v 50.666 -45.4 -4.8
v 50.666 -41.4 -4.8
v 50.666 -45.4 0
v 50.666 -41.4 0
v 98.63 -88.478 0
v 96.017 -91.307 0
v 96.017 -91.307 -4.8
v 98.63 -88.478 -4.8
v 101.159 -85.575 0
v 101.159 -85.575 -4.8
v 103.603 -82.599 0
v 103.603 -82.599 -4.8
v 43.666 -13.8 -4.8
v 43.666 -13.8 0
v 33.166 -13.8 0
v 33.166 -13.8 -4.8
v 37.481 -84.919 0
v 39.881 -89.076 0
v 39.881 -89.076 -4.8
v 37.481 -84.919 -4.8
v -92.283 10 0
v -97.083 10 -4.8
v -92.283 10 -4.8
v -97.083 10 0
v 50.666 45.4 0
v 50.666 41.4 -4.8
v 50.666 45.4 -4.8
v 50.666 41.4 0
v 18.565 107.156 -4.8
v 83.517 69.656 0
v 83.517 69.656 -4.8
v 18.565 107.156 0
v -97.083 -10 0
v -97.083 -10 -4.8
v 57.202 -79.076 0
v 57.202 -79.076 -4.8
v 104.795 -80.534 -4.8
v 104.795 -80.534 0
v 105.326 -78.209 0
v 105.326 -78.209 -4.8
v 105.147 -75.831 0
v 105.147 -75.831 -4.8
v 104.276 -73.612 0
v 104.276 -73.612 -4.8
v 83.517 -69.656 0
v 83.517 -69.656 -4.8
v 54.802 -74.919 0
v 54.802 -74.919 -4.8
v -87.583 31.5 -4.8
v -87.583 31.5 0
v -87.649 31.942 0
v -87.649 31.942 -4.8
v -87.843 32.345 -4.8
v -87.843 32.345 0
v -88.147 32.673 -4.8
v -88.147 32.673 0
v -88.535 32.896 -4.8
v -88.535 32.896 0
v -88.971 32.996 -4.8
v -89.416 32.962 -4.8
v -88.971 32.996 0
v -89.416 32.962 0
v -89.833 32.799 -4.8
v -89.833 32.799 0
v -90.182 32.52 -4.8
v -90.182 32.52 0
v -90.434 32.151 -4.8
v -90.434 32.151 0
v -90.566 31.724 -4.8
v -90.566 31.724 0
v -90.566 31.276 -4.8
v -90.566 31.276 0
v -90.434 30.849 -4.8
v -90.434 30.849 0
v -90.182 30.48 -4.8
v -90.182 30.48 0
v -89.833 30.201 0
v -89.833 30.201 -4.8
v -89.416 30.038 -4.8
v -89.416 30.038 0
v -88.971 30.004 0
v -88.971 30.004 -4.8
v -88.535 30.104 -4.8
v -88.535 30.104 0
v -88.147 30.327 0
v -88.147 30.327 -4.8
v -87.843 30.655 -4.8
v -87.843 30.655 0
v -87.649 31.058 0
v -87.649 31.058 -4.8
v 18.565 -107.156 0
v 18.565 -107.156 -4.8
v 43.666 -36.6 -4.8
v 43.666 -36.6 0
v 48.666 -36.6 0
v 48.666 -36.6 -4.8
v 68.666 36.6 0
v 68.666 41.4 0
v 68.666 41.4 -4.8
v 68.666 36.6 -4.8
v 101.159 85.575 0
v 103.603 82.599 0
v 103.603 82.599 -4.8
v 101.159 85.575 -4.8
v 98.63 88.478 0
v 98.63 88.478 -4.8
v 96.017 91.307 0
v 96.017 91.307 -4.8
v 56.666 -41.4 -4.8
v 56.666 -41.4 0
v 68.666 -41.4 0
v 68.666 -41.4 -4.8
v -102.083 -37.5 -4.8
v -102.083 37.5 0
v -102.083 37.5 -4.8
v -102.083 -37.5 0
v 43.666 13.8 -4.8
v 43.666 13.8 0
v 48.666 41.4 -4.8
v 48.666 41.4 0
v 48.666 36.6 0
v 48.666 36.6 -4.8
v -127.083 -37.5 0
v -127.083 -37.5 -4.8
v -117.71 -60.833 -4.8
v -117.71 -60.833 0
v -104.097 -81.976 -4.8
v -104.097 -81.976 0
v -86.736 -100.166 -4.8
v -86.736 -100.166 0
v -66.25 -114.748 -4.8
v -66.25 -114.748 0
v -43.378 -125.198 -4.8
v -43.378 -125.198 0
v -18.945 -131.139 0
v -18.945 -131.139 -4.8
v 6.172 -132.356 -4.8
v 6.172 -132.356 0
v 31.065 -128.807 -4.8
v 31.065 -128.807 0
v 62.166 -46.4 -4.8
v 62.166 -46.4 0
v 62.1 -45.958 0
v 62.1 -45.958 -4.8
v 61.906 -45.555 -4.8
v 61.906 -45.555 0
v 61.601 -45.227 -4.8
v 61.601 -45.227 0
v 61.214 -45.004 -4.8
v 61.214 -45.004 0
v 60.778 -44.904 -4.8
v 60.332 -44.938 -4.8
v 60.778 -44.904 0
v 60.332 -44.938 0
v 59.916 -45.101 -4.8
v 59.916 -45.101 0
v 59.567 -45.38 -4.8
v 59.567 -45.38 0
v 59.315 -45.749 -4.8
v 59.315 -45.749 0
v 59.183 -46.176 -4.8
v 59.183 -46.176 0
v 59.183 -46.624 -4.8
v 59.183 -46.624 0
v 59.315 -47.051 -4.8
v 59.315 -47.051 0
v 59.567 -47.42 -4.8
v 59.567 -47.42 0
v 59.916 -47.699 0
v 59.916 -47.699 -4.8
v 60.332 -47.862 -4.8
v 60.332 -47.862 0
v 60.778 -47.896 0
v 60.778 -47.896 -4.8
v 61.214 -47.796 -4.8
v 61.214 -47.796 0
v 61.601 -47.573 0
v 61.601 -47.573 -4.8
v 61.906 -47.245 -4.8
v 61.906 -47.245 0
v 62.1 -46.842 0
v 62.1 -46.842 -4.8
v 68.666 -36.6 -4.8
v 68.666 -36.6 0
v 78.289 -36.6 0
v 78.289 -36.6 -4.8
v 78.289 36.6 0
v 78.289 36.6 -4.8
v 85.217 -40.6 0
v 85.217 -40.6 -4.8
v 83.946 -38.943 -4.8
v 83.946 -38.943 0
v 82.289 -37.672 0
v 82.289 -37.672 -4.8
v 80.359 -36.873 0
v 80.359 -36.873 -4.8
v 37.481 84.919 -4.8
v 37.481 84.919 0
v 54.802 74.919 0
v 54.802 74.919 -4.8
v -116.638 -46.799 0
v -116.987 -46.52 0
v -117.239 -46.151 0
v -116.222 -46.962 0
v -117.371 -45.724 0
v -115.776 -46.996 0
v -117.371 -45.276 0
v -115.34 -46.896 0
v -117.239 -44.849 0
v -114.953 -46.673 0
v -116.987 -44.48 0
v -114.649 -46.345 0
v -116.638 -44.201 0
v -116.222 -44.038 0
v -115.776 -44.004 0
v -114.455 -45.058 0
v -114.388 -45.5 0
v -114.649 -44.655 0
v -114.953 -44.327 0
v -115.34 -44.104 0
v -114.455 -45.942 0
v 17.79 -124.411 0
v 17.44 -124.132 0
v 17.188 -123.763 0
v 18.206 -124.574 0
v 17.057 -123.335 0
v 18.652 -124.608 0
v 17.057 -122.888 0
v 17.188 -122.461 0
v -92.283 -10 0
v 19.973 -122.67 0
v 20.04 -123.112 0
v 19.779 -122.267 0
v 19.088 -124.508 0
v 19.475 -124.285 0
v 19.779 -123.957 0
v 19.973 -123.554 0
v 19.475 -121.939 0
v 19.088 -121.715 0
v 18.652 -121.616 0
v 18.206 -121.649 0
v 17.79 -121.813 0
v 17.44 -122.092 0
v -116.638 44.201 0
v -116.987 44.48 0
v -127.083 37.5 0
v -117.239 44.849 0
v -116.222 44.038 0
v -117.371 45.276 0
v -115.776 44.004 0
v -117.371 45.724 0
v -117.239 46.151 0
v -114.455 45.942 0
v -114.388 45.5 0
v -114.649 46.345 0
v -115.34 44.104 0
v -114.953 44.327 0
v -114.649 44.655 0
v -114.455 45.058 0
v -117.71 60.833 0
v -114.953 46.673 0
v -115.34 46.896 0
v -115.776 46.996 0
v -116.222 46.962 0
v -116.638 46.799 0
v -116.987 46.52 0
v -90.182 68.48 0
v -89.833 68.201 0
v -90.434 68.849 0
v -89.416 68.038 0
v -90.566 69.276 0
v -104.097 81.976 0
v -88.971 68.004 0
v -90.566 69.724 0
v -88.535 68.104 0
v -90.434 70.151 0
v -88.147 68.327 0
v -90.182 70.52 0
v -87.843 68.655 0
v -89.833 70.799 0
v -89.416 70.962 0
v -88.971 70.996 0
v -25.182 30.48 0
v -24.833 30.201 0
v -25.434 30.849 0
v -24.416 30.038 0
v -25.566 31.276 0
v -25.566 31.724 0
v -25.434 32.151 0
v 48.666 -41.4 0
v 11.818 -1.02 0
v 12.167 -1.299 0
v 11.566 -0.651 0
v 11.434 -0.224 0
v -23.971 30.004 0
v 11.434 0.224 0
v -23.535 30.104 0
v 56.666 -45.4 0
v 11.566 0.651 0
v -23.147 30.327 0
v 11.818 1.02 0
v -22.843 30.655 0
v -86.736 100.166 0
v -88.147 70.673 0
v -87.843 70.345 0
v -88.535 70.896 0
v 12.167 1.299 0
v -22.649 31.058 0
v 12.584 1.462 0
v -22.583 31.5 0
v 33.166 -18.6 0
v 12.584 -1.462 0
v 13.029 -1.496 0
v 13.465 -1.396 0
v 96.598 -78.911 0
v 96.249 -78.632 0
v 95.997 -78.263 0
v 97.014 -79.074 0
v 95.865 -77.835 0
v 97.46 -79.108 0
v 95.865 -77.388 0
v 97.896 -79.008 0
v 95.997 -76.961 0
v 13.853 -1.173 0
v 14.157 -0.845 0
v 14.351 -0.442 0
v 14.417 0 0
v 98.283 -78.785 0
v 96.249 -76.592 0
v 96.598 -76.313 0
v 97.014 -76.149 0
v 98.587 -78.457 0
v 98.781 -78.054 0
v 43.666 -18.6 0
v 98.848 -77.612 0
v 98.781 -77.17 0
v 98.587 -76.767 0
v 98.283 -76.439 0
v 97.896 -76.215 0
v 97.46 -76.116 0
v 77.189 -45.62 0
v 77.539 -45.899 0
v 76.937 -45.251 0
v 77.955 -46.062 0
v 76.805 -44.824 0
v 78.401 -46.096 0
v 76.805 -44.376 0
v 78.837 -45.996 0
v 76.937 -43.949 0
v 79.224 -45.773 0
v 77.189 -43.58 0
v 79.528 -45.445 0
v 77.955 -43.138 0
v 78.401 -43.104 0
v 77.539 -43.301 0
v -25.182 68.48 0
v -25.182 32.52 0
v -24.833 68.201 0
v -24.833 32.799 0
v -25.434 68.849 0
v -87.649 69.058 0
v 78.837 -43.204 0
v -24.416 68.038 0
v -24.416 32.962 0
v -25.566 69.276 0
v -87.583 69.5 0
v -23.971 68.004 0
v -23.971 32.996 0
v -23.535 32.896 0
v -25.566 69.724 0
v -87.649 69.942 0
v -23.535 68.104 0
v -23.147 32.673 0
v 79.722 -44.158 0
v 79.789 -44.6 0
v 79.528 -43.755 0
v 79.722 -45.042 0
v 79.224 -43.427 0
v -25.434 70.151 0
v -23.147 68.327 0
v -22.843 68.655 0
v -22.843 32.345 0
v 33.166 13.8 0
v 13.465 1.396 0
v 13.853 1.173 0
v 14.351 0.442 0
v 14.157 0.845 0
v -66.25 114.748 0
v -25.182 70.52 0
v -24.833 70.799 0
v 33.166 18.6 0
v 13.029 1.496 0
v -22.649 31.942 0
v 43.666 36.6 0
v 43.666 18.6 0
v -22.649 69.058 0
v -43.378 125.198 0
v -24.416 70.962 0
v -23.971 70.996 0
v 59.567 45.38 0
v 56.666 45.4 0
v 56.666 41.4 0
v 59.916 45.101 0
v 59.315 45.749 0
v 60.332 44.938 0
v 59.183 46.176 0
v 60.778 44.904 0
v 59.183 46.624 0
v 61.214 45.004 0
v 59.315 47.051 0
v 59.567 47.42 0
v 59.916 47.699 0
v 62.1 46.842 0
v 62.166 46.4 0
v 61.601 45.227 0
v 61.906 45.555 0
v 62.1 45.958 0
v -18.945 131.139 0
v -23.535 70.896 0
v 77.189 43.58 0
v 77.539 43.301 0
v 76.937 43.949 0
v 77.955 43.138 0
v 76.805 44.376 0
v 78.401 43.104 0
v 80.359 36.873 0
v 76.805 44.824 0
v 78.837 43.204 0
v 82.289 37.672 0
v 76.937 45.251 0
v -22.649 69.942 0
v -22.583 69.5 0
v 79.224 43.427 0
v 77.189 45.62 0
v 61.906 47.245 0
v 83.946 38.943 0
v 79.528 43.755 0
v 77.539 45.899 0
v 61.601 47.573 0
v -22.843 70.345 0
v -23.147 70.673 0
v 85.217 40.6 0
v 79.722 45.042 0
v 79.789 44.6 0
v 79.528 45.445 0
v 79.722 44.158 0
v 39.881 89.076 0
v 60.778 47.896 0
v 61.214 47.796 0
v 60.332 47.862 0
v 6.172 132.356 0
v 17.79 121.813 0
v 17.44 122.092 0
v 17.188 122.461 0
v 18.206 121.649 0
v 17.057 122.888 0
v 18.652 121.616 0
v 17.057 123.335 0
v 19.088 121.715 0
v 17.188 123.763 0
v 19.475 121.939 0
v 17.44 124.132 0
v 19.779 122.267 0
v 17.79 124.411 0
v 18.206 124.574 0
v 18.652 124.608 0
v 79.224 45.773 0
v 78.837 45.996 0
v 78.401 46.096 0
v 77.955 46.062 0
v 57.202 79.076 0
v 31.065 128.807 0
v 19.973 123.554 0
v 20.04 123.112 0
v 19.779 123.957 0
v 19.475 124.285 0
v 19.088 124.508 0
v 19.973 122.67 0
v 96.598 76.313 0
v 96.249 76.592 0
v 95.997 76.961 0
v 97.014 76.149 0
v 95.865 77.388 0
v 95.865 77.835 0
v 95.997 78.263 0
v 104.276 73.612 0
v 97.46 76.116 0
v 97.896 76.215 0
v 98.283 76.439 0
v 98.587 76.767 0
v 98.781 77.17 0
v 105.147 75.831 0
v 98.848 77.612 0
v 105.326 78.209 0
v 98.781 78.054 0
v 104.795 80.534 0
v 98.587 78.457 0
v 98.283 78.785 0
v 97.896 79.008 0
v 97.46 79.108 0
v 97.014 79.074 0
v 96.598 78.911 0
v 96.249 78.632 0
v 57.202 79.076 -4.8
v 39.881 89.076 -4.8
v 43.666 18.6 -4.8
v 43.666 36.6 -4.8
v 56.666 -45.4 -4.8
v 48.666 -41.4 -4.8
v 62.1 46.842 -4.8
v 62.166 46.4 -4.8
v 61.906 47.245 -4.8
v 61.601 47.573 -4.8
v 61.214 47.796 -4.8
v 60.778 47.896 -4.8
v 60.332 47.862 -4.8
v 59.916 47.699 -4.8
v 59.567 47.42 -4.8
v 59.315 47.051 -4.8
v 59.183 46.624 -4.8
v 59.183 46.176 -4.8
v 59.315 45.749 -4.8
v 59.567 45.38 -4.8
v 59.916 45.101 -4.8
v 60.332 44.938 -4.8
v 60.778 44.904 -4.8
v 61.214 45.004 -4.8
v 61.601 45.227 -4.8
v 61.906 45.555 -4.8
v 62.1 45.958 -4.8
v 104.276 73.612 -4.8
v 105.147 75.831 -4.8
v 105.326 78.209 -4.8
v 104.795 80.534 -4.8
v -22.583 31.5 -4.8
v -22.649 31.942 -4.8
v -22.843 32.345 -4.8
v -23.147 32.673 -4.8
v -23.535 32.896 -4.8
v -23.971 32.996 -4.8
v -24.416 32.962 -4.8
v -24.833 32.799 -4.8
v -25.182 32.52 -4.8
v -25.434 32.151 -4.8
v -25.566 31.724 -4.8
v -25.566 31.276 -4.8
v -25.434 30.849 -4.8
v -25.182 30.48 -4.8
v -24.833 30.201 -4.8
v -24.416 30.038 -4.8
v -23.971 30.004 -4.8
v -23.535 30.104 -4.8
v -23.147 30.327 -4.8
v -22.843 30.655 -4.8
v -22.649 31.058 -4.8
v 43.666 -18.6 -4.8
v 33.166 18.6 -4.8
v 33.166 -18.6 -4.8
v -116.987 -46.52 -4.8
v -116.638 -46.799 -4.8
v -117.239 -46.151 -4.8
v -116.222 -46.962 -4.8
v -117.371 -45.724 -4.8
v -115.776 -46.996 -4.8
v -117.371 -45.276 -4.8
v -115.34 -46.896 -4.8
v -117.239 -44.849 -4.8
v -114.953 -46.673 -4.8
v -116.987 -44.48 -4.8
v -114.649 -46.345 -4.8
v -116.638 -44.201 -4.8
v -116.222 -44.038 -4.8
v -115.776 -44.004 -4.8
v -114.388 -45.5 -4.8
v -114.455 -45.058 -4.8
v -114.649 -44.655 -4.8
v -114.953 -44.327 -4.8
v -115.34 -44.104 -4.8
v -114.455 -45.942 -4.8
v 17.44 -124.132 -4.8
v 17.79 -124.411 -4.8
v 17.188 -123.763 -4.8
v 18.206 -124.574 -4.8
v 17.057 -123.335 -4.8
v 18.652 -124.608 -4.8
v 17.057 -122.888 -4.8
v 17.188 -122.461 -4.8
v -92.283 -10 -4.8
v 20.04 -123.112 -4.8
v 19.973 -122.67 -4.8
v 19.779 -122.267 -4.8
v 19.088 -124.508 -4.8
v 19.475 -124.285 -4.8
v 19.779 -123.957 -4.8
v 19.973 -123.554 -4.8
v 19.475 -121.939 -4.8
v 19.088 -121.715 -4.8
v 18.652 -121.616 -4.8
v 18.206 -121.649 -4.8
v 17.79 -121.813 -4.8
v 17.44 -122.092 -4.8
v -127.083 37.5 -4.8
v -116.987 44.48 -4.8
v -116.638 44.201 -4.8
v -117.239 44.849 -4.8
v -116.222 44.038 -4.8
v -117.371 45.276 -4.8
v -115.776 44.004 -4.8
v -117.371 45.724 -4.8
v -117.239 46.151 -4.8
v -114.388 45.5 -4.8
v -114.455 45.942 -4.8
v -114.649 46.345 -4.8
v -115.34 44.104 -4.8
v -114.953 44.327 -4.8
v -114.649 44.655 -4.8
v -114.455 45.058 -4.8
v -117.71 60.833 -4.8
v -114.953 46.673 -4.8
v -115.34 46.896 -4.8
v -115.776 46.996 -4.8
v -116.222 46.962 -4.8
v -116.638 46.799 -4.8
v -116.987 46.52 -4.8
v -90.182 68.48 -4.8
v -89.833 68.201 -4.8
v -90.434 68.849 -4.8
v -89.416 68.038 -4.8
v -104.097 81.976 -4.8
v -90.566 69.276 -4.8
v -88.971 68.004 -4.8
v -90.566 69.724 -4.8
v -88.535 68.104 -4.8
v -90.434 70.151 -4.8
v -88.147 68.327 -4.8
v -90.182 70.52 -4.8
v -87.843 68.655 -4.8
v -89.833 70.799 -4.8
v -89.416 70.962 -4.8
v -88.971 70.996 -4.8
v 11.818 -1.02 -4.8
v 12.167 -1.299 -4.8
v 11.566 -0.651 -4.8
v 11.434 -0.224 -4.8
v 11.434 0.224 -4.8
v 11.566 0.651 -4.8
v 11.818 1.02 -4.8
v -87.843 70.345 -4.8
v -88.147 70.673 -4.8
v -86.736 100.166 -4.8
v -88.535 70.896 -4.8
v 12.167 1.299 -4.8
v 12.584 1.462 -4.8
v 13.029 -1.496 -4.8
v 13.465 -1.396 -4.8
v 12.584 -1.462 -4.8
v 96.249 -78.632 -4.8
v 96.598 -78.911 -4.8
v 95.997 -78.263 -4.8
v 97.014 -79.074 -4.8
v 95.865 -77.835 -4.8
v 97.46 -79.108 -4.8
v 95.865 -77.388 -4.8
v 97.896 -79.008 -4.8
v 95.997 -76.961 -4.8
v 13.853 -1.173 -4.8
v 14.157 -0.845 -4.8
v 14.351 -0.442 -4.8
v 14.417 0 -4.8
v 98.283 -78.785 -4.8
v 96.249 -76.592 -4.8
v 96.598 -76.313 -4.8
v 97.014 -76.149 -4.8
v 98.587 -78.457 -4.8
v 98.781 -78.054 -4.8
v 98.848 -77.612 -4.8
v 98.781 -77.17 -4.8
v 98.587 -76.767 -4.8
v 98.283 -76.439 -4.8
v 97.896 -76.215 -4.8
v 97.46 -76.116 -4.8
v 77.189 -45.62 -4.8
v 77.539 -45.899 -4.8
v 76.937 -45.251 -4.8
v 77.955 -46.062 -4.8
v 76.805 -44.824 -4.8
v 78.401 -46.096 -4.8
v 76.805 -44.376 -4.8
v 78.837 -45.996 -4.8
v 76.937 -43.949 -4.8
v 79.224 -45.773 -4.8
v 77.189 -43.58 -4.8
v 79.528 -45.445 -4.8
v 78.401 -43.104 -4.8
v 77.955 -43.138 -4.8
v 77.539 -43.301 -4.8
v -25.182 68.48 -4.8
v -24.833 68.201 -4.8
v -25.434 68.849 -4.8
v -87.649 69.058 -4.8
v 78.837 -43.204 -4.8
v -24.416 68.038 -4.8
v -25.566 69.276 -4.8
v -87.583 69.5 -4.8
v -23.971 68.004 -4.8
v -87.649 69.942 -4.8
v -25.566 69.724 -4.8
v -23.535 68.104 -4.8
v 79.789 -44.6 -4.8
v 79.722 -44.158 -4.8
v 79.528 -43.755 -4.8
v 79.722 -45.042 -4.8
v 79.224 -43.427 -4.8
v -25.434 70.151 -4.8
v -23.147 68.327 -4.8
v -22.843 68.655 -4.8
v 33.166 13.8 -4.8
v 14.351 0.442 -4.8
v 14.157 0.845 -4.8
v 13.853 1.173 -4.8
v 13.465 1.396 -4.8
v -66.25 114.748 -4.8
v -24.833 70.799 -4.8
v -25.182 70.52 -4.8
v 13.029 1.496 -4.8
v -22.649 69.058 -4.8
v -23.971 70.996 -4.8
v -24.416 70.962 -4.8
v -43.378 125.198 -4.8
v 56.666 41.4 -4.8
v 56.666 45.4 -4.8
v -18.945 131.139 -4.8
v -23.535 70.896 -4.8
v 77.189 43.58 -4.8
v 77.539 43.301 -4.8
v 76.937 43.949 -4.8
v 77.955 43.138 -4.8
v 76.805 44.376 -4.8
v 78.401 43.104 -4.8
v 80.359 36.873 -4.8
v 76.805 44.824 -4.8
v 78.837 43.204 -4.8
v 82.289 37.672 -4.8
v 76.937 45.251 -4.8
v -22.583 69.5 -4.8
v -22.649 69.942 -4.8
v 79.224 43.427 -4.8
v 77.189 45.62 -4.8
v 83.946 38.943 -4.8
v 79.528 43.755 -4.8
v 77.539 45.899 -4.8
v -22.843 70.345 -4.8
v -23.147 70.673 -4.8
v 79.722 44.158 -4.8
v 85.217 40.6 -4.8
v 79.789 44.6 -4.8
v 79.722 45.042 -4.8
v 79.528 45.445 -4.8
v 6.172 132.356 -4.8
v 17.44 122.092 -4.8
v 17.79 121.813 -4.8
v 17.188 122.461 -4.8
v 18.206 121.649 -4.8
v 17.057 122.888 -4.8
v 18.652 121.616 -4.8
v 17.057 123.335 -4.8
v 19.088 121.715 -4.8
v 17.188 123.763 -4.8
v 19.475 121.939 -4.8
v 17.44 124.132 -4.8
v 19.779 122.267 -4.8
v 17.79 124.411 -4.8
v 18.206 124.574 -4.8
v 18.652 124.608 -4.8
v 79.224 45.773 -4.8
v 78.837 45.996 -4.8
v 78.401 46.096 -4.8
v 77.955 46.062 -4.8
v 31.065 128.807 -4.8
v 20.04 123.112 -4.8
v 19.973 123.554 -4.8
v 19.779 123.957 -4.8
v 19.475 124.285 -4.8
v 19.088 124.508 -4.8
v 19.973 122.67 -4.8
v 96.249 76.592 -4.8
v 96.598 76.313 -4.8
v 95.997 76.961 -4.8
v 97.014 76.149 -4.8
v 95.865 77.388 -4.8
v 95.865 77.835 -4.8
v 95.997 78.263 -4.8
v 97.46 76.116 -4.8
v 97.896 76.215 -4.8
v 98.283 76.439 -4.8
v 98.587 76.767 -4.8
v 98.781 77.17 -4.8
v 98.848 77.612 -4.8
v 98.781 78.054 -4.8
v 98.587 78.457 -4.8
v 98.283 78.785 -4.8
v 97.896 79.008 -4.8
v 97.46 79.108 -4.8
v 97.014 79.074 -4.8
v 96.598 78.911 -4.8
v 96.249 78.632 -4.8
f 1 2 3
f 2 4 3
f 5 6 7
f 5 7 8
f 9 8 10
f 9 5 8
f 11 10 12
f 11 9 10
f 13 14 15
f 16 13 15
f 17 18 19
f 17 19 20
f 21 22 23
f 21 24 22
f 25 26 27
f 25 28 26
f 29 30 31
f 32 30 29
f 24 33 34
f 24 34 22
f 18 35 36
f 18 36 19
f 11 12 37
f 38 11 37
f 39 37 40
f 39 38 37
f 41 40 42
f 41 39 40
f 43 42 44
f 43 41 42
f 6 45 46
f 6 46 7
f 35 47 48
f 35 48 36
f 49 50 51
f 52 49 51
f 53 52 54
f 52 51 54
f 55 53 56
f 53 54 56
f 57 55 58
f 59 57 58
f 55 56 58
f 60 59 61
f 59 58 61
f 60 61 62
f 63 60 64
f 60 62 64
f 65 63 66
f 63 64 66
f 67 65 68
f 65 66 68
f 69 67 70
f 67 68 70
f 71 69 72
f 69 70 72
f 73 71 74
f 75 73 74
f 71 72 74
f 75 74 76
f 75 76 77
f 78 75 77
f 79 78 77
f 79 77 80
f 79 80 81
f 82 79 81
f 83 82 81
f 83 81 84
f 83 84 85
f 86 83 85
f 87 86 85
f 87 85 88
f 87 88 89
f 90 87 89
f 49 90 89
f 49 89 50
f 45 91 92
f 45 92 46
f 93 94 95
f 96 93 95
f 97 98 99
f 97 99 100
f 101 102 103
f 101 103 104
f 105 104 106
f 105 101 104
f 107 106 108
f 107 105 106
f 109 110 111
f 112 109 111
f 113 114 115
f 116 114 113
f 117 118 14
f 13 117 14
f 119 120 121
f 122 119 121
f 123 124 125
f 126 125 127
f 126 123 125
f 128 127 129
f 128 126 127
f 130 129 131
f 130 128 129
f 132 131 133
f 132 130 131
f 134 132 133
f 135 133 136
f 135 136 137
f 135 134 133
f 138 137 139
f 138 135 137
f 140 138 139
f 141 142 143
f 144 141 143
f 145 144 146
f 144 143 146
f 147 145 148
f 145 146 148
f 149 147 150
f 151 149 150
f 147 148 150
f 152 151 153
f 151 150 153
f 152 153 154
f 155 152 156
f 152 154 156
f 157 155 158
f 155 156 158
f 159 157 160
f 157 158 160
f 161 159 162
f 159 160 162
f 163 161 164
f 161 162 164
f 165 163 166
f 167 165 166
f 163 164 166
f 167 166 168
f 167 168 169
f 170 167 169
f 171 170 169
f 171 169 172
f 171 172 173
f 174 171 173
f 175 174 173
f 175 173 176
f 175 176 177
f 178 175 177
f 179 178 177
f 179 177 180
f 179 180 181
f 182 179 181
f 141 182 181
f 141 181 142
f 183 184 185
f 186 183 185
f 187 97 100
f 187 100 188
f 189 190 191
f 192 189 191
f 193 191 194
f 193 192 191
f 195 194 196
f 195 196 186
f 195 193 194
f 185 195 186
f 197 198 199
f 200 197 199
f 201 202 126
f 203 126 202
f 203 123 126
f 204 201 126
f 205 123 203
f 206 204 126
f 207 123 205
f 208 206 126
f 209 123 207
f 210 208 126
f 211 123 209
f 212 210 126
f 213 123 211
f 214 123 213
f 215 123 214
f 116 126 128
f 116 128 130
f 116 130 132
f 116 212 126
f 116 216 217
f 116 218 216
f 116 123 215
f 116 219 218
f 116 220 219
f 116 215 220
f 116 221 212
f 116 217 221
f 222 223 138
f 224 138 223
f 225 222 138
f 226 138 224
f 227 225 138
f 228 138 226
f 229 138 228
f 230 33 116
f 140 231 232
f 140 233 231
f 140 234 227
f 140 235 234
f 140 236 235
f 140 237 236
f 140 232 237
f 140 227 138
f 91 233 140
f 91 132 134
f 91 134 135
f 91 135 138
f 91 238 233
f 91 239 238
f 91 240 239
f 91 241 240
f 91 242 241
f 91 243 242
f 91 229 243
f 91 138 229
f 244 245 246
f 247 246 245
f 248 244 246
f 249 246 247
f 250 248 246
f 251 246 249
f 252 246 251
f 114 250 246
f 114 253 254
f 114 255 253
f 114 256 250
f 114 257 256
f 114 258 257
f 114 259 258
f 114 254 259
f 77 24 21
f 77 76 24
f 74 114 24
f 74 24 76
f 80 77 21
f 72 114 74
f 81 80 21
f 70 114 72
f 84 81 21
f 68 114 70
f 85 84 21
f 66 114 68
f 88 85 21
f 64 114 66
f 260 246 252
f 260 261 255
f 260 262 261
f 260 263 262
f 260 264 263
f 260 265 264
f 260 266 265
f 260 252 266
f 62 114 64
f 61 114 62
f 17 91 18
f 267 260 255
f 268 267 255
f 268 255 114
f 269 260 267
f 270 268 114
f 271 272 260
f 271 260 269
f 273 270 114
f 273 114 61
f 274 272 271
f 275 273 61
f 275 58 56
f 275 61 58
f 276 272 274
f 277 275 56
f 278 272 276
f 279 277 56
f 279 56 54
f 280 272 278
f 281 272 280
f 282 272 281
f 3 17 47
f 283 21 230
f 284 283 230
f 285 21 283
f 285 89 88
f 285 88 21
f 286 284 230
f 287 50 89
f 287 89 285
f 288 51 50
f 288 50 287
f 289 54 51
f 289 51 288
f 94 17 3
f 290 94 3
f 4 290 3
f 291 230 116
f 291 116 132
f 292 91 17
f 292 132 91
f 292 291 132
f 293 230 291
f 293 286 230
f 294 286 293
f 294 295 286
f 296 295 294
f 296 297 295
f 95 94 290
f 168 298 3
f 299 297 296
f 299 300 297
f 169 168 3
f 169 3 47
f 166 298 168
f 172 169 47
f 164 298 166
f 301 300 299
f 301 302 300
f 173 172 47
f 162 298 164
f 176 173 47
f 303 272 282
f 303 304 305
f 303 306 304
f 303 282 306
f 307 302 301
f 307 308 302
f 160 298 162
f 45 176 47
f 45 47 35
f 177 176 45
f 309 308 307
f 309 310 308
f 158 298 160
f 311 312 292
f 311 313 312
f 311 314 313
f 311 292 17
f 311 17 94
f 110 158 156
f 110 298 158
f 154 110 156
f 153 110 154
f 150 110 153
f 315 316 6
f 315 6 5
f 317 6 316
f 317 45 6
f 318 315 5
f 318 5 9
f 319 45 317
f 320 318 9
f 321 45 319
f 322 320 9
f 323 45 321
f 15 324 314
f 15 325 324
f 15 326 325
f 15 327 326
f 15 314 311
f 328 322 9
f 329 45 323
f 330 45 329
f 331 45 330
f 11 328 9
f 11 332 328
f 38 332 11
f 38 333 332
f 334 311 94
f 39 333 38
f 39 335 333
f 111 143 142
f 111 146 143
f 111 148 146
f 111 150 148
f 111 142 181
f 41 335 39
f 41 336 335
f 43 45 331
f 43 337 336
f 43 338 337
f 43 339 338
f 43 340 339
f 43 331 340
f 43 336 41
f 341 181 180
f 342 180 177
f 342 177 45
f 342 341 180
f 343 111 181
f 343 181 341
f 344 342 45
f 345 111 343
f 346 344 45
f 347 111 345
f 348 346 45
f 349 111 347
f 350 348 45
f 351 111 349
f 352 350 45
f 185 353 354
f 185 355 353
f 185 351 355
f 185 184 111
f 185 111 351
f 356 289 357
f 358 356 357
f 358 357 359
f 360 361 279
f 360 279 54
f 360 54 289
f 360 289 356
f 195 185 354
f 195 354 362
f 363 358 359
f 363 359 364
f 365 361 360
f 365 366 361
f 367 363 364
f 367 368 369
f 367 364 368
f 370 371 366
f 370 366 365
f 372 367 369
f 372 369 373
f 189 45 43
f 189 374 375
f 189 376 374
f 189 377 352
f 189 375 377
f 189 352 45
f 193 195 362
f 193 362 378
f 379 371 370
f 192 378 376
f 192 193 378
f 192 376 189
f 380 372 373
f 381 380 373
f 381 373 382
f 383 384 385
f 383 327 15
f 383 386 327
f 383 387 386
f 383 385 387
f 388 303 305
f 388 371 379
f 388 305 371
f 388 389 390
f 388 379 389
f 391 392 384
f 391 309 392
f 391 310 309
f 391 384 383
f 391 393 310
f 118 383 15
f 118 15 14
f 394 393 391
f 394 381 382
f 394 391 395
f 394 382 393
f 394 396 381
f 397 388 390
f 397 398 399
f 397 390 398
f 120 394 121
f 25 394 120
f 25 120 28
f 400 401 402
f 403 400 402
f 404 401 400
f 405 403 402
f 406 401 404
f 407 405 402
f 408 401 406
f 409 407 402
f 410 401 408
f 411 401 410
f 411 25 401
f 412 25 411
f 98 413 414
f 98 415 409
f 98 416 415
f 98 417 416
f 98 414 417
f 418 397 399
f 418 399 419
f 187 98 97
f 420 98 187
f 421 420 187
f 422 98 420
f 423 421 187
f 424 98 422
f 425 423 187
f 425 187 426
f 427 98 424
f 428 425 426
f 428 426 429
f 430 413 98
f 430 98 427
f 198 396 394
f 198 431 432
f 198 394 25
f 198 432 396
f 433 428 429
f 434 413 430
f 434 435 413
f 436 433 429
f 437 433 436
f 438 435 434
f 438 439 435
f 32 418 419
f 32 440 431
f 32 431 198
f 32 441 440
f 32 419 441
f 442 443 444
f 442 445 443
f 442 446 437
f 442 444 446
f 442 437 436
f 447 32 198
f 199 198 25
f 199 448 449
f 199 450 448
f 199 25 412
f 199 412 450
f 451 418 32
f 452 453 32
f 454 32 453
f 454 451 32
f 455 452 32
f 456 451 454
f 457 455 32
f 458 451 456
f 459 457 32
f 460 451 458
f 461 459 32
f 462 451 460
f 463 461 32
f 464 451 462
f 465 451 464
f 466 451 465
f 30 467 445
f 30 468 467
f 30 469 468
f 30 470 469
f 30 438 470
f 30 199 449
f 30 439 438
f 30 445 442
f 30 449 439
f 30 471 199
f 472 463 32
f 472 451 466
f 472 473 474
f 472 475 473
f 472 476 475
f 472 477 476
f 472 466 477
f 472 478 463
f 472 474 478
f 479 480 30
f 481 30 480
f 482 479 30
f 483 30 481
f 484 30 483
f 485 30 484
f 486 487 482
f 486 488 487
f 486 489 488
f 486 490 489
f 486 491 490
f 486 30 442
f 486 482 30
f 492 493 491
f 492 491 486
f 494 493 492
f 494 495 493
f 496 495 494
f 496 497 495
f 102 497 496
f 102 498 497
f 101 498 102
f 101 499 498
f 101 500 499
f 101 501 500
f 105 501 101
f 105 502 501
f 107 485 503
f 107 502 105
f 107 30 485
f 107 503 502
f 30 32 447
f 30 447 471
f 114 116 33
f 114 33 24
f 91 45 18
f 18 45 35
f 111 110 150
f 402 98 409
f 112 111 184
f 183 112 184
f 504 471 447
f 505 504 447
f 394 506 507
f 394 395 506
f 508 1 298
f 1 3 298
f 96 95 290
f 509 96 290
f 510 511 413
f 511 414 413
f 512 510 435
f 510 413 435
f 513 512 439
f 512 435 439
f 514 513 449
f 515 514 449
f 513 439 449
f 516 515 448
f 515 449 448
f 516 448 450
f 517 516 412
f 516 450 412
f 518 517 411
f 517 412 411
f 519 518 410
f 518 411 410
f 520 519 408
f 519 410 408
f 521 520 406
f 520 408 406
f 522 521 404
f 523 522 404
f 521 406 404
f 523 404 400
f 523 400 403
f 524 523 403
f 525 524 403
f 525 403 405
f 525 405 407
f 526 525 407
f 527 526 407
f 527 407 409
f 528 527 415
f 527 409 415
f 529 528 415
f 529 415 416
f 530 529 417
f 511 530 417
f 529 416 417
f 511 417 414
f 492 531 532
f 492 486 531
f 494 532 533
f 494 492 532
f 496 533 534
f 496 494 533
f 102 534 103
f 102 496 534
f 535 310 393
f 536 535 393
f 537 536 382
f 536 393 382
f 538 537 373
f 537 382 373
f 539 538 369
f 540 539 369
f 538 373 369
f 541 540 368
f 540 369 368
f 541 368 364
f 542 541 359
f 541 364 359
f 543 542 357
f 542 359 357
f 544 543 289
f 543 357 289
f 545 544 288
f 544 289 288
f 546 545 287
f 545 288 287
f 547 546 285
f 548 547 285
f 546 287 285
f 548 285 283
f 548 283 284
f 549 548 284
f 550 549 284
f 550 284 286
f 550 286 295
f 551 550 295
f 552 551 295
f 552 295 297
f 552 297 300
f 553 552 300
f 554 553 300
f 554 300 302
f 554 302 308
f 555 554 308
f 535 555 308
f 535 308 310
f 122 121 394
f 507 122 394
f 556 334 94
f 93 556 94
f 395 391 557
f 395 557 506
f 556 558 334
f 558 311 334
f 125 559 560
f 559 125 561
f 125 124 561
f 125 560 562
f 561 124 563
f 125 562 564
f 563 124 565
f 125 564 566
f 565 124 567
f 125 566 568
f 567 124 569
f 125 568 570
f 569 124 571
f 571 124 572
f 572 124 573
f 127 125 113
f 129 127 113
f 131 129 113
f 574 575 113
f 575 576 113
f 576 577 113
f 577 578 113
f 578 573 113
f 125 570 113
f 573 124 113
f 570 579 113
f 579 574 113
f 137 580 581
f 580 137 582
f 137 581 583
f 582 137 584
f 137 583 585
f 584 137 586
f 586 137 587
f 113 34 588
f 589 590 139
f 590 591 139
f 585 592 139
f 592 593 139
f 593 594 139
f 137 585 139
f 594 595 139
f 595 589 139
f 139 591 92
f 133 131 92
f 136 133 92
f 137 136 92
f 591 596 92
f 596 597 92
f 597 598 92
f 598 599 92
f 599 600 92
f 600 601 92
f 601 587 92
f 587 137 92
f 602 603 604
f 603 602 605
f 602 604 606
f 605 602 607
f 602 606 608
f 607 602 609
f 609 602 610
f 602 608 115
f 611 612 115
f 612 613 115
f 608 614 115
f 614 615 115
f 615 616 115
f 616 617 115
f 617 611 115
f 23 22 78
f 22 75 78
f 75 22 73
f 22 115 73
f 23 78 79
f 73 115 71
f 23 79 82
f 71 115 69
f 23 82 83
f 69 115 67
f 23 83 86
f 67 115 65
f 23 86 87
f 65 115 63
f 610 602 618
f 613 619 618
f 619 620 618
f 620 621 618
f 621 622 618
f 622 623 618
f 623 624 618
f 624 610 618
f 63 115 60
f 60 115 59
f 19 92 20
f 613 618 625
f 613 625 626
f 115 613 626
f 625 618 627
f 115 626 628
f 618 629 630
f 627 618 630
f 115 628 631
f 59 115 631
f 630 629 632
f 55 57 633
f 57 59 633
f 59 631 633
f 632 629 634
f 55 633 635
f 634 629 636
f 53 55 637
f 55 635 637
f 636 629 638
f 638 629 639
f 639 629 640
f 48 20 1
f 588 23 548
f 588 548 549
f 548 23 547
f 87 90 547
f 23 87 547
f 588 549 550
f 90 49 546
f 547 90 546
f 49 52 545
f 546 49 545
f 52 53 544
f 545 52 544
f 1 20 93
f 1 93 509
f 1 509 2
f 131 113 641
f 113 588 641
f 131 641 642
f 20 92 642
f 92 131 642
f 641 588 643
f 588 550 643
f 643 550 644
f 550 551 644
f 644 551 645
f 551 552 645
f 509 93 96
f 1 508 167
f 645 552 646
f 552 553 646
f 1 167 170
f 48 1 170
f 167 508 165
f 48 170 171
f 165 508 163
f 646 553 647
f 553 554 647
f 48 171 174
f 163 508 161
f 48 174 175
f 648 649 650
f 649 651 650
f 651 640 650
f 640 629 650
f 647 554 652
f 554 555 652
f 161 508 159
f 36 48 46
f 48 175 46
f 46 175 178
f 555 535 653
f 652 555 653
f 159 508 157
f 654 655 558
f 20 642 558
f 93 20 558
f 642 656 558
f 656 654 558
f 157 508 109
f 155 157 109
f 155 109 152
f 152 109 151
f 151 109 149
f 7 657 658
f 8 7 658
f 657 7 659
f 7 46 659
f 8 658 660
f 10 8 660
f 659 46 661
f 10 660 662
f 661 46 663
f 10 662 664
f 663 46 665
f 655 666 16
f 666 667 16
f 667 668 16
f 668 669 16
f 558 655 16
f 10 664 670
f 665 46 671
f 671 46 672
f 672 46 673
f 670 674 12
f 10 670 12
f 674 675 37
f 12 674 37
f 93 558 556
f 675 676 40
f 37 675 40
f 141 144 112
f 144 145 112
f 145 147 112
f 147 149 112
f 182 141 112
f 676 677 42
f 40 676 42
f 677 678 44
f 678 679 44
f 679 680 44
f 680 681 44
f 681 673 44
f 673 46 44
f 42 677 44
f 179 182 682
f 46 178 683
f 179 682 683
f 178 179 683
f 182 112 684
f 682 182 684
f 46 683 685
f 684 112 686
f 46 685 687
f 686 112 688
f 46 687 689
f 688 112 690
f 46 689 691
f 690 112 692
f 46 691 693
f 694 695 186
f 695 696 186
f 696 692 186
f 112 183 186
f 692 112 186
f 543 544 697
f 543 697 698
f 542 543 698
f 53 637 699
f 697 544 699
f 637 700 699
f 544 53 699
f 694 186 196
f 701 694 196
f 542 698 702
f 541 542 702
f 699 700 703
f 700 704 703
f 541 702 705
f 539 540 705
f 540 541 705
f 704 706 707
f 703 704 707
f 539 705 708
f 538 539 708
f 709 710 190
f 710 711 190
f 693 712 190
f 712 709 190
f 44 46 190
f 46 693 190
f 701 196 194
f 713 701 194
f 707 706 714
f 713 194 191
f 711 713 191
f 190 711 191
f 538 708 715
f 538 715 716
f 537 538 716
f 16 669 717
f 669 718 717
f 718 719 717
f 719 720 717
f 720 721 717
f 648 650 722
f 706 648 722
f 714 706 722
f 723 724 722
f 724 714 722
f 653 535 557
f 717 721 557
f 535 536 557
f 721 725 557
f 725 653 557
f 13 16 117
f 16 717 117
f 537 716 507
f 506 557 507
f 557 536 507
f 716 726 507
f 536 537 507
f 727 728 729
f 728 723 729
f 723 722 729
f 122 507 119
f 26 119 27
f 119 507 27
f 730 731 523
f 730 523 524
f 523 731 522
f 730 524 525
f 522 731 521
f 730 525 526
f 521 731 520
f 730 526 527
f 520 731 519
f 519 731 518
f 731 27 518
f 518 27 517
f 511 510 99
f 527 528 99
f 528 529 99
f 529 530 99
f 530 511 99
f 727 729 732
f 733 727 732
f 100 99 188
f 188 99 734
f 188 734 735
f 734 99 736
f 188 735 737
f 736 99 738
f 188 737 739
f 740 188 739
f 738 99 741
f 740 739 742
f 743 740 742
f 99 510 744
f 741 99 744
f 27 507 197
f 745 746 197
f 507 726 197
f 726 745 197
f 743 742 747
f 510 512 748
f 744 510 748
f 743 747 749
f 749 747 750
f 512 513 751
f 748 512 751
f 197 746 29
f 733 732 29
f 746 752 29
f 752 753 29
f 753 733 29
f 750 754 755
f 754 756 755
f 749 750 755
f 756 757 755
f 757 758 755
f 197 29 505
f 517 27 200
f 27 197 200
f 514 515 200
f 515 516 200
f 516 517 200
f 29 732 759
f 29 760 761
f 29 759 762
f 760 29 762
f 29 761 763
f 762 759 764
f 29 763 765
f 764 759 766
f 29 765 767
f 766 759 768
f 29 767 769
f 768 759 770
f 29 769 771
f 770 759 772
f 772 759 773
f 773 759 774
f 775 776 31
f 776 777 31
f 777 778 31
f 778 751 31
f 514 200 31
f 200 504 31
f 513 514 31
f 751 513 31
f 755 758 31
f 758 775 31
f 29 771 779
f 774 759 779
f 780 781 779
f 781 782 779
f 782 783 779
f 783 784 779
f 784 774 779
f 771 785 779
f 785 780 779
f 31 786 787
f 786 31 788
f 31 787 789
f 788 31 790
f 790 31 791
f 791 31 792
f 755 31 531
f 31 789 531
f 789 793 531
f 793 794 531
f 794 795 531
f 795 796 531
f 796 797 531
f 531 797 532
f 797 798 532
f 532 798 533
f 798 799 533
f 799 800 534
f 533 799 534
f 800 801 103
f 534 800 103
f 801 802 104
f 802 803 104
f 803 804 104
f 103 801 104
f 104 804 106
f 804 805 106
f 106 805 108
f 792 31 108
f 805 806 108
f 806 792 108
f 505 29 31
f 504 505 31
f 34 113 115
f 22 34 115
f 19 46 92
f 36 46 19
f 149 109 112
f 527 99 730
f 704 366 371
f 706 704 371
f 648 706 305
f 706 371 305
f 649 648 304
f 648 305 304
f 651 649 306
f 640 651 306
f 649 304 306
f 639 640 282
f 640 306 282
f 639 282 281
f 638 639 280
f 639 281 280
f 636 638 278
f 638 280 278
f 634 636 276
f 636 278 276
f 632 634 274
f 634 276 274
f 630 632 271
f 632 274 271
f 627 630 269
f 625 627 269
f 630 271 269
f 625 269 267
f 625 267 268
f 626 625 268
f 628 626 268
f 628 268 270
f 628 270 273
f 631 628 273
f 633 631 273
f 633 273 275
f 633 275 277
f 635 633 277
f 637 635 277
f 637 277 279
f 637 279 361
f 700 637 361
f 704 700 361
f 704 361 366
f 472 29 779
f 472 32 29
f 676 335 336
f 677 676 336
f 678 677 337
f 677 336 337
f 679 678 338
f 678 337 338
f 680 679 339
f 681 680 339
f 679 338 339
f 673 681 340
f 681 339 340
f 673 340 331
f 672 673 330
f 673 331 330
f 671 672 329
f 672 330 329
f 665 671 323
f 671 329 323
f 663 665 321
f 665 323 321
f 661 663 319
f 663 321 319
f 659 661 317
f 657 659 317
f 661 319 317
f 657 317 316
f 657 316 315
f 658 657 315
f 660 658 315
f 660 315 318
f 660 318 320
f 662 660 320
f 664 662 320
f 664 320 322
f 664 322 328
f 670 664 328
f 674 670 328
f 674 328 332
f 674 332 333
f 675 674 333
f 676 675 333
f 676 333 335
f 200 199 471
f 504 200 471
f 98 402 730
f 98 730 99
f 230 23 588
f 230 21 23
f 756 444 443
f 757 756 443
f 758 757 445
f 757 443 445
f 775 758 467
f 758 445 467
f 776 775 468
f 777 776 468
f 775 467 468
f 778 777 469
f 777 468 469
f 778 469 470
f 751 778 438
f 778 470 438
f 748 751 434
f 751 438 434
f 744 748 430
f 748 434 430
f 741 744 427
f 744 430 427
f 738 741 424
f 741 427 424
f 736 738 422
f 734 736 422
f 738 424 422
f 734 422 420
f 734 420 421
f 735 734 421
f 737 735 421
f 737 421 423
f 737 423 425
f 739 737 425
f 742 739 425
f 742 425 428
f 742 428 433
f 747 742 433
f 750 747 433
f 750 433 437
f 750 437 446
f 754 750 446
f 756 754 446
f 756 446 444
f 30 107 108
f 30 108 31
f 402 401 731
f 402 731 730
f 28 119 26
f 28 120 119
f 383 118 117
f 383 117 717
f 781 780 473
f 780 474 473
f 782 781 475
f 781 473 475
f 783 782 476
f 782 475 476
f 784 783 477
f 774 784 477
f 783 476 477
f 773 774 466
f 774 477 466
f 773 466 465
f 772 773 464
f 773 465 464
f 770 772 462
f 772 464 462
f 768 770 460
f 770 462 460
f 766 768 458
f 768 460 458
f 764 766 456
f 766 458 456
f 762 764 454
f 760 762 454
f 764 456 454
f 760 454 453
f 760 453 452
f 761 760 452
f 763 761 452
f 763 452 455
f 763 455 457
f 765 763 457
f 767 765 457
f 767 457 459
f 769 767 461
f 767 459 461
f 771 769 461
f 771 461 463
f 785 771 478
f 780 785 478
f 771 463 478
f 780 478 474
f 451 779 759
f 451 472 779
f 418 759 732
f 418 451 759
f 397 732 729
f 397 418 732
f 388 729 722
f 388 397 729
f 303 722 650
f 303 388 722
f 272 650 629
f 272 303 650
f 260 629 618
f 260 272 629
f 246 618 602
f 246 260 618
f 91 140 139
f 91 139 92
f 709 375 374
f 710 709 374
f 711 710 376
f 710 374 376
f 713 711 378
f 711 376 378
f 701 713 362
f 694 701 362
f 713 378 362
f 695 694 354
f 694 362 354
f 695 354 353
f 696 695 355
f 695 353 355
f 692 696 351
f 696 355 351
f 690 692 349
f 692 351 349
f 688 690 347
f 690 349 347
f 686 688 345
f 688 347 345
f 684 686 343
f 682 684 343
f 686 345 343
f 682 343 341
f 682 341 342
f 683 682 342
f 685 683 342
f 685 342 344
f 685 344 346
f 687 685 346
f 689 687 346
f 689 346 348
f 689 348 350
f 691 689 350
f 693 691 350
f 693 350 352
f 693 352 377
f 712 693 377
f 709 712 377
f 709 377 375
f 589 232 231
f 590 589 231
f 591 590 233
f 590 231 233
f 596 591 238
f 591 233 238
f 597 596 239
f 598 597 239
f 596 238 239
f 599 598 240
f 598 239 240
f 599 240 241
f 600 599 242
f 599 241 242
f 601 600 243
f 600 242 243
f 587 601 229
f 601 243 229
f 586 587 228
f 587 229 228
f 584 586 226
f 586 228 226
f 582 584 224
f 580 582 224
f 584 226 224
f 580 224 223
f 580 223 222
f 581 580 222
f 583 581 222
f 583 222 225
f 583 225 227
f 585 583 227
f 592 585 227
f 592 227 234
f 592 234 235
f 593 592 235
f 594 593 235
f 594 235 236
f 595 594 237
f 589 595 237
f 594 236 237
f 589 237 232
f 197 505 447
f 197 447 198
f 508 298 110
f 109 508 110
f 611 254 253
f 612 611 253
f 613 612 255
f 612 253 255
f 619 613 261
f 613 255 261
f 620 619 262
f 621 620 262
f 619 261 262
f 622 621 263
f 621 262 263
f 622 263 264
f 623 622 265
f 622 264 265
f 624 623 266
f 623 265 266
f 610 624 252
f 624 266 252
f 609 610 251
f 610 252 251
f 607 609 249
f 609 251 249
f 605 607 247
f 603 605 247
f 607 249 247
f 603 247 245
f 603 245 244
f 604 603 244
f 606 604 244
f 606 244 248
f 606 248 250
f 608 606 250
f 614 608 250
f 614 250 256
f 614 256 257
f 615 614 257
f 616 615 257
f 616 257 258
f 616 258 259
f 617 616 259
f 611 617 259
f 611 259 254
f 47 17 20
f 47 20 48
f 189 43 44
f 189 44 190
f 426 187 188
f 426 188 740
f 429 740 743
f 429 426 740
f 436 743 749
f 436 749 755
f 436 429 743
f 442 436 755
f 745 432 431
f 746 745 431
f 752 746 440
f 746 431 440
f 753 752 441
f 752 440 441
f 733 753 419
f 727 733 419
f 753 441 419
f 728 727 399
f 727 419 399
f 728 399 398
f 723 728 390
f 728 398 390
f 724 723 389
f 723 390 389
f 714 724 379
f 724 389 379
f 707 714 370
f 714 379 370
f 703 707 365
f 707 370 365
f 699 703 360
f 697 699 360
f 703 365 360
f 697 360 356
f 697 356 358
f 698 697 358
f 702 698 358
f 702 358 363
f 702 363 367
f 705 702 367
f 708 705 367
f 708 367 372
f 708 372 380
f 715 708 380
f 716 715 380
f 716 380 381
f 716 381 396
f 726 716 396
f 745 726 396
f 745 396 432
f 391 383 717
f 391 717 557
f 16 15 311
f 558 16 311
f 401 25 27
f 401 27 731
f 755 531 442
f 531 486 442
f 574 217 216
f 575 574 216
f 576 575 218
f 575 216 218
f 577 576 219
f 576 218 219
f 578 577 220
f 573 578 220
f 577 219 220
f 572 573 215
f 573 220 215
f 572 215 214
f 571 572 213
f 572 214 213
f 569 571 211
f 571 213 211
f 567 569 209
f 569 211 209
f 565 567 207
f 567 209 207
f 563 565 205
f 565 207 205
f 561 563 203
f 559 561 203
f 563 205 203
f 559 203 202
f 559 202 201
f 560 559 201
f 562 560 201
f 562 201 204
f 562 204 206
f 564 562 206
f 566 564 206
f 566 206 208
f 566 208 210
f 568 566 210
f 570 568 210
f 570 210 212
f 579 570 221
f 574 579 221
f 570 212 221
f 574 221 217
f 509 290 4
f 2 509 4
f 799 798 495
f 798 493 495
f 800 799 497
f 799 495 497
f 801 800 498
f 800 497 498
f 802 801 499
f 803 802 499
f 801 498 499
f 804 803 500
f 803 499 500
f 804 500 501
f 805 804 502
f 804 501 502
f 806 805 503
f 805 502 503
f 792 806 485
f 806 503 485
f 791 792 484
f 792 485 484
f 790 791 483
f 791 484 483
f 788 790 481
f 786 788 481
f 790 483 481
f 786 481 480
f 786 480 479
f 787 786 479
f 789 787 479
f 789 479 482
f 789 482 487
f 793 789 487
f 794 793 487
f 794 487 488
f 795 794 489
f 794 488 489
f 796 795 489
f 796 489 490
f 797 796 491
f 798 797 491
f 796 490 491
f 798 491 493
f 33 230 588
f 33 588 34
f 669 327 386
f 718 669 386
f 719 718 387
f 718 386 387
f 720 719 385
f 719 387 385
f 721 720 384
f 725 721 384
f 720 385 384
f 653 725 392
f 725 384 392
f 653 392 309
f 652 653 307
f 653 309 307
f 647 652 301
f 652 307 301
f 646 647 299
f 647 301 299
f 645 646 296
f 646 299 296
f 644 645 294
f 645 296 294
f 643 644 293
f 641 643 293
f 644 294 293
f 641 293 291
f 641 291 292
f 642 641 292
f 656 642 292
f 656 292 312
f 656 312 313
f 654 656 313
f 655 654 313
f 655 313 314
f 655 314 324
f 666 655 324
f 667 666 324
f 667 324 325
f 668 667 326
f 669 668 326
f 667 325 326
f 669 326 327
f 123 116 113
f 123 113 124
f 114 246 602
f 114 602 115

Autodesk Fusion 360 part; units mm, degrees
sketch "Sketch1" plane through (0, 0, 0) normal (0, 0, 1) x (1, 0, 0)
  line L0 (-127.0827, 37.5) -> (-102.0827, 37.5)
  line L1 (-102.0827, 37.5) -> (-102.0827, -37.5)
  line L2 (-102.0827, -37.5) -> (-127.0827, -37.5)
  line L3 (0, 0) -> (-132.5, 0) construction
  line L4 (-97.0827, 10) -> (-92.2827, 10)
  line L5 (-92.2827, 10) -> (-92.2827, -10)
  line L6 (-92.2827, -10) -> (-97.0827, -10)
  line L7 (-97.0827, -10) -> (-97.0827, 10)
  arc A0 (-127.0827, 37.5) -> (-132.5, 0) centre (0, 0) ccw construction
  arc A1 (-132.5, 0) -> (-127.0827, -37.5) centre (0, 0) ccw construction
  line L8 (0, 0) -> (66.25, -114.7484) construction
  line L9 (0, 0) -> (66.25, -114.7484) construction
  line L10 (31.0654, -128.8068) -> (18.5654, -107.1562)
  line L11 (18.5654, -107.1562) -> (83.5173, -69.6562)
  line L12 (83.5173, -69.6562) -> (96.0173, -91.3068)
  arc A2 (-127.0827, -37.5) -> (31.0654, -128.8068) centre (0, 0) ccw
  arc A3 (31.0654, -128.8068) -> (66.25, -114.7484) centre (0, 0) ccw construction
  line L13 (37.4811, -84.9191) -> (54.8016, -74.9191)
  line L14 (54.8016, -74.9191) -> (57.2016, -79.076)
  line L15 (57.2016, -79.076) -> (39.8811, -89.076)
  line L16 (39.8811, -89.076) -> (37.4811, -84.9191)
  line L17 (0, 0) -> (132.5, 0) construction
  line L18 (0, 0) -> (66.25, 114.7484) construction
  line L19 (96.0173, 91.3068) -> (83.5173, 69.6562)
  line L20 (83.5173, 69.6562) -> (18.5654, 107.1562)
  line L21 (18.5654, 107.1562) -> (31.0654, 128.8068)
  line L22 (57.2016, 79.076) -> (39.8811, 89.076)
  line L23 (39.8811, 89.076) -> (37.4811, 84.9191)
  line L24 (37.4811, 84.9191) -> (54.8016, 74.9191)
  line L25 (54.8016, 74.9191) -> (57.2016, 79.076)
  circle A4 centre (-115.8879, 45.5) radius 1.5
  circle A5 centre (0, 0) radius 124.5 construction
  circle A6 centre (-115.8879, -45.5) radius 1.5
  circle A7 centre (18.5398, -123.1118) radius 1.5
  circle A8 centre (97.3481, -77.6118) radius 1.5
  circle A9 centre (18.5398, 123.1118) radius 1.5
  line L26 (-102.0827, -18.5) -> (-19.0827, -18.5) construction
  line L27 (-19.0827, -18.5) -> (-19.0827, 18.5) construction
  line L28 (-19.0827, 18.5) -> (-102.0827, 18.5) construction
  line L29 (35.0199, 97.6562) -> (-6.4801, 25.7761) construction
  line L30 (-6.4801, 25.7761) -> (25.5628, 7.2761) construction
  line L31 (25.5628, 7.2761) -> (67.0628, 79.1562) construction
  line L32 (35.0199, -97.6562) -> (-6.4801, -25.7761) construction
  line L33 (-6.4801, -25.7761) -> (25.5628, -7.2761) construction
  line L34 (25.5628, -7.2761) -> (67.0628, -79.1562) construction
  line L35 (-92.0827, 72.5) -> (-21.0827, 72.5) construction
  line L36 (-21.0827, 72.5) -> (-21.0827, 28.5) construction
  line L37 (-21.0827, 28.5) -> (-92.0827, 28.5) construction
  line L38 (-92.0827, 28.5) -> (-92.0827, 72.5) construction
  circle A10 centre (-24.0827, 69.5) radius 1.5
  circle A11 centre (-89.0827, 69.5) radius 1.5
  circle A12 centre (-89.0827, 31.5) radius 1.5
  circle A13 centre (-24.0827, 31.5) radius 1.5
  arc A14 (66.25, -114.7484) -> (96.0173, -91.3068) centre (0, 0) ccw construction
  arc A15 (96.0173, 91.3068) -> (66.25, 114.7484) centre (0, 0) ccw construction
  arc A16 (31.0654, 128.8068) -> (-127.0827, 37.5) centre (0, 0) ccw
  arc A17 (66.25, 114.7484) -> (31.0654, 128.8068) centre (0, 0) ccw construction
  line L39 (125.8662, 41.4) -> (43.6662, 41.4) construction
  line L40 (43.6662, 41.4) -> (43.6662, -41.4) construction
  line L41 (43.6662, -41.4) -> (125.8662, -41.4) construction
  line L42 (43.6662, 13.8) -> (33.1662, 13.8)
  line L43 (33.1662, 13.8) -> (33.1662, 18.6)
  line L44 (33.1662, 18.6) -> (43.6662, 18.6)
  line L45 (68.6662, 36.6) -> (78.2887, 36.6)
  circle A18 centre (97.3481, 77.6118) radius 1.5
  line L46 (104.2763, 73.6118) -> (85.2169, 40.6)
  circle A19 centre (78.2887, 44.6) radius 1.5
  line L47 (43.6662, 13.8) -> (43.6662, -13.8)
  line L48 (43.6662, -13.8) -> (33.1662, -13.8)
  line L49 (33.1662, -13.8) -> (33.1662, -18.6)
  line L50 (33.1662, -18.6) -> (43.6662, -18.6)
  line L51 (68.6662, -36.6) -> (78.2887, -36.6)
  line L52 (104.2763, -73.6118) -> (85.2169, -40.6)
  circle A20 centre (78.2887, -44.6) radius 1.5
  arc A21 (132.5, 0) -> (125.8662, 41.4) centre (0, 0) ccw construction
  arc A22 (103.6034, 82.599) -> (96.0173, 91.3068) centre (0, 0) ccw
  arc A23 (106.9418, 78.2286) -> (103.6034, 82.599) centre (0, 0) ccw construction
  line L53 (106.9418, 78.2286) -> (104.2763, 73.6118) construction
  arc A24 (125.8662, 41.4) -> (106.9418, 78.2286) centre (0, 0) ccw construction
  line L54 (78.2887, 36.6) -> (82.9075, 36.6) construction
  arc A25 (85.2169, 40.6) -> (78.2887, 36.6) centre (78.2887, 44.6) ccw construction
  arc A26 (78.2887, 36.6) -> (85.2169, 40.6) centre (78.2887, 44.6) ccw
  line L55 (85.2169, 40.6) -> (82.9075, 36.6) construction
  line L56 (78.2887, -36.6) -> (82.9075, -36.6) construction
  line L57 (85.2169, -40.6) -> (82.9075, -36.6) construction
  arc A27 (78.2887, -36.6) -> (85.2169, -40.6) centre (78.2887, -44.6) ccw construction
  arc A28 (85.2169, -40.6) -> (78.2887, -36.6) centre (78.2887, -44.6) ccw
  arc A29 (96.0173, -91.3068) -> (103.6034, -82.599) centre (0, 0) ccw
  arc A30 (125.8662, -41.4) -> (132.5, 0) centre (0, 0) ccw construction
  arc A31 (106.9418, -78.2286) -> (125.8662, -41.4) centre (0, 0) ccw construction
  line L58 (106.9418, -78.2286) -> (104.2763, -73.6118) construction
  arc A32 (103.6034, -82.599) -> (106.9418, -78.2286) centre (0, 0) ccw construction
  arc A33 (104.2763, -73.6118) -> (103.6034, -82.599) centre (97.3481, -77.6118) ccw construction
  arc A34 (103.6034, -82.599) -> (104.2763, -73.6118) centre (97.3481, -77.6118) ccw
  arc A35 (103.6034, 82.599) -> (104.2763, 73.6118) centre (97.3481, 77.6118) ccw construction
  arc A36 (104.2763, 73.6118) -> (103.6034, 82.599) centre (97.3481, 77.6118) ccw
  line L59 (33.1662, 13.8) -> (33.1662, -13.8) construction
  line L60 (48.6662, 41.4) -> (48.6662, 36.6)
  line L61 (68.6662, 41.4) -> (68.6662, 36.6)
  line L62 (48.6662, 36.6) -> (43.6662, 36.6)
  line L63 (43.6662, 18.6) -> (43.6662, 36.6)
  line L64 (50.6662, 41.4) -> (50.6662, 45.4)
  line L65 (50.6662, 45.4) -> (56.6662, 45.4)
  line L66 (56.6662, 45.4) -> (56.6662, 41.4)
  circle A37 centre (60.6662, 46.4) radius 1.5
  line L67 (48.6662, 41.4) -> (50.6662, 41.4)
  line L68 (56.6662, 41.4) -> (68.6662, 41.4)
  line L69 (43.6662, -36.6) -> (48.6662, -36.6)
  line L70 (48.6662, -36.6) -> (48.6662, -41.4)
  line L71 (48.6662, -41.4) -> (50.6662, -41.4)
  line L72 (50.6662, -41.4) -> (50.6662, -45.4)
  line L73 (50.6662, -45.4) -> (56.6662, -45.4)
  line L74 (56.6662, -45.4) -> (56.6662, -41.4)
  line L75 (56.6662, -41.4) -> (68.6662, -41.4)
  line L76 (68.6662, -41.4) -> (68.6662, -36.6)
  line L77 (43.6662, -18.6) -> (43.6662, -36.6)
  circle A38 centre (60.6662, -46.4) radius 1.5
  circle A39 centre (12.9173, 0) radius 1.5
  point P0 (-102.0827, 0)
  point P1 (-97.0827, 0)
  point P2 (51.0413, -88.4062)
  point P3 (48.5413, -84.076)
  point P4 (51.0413, 88.4062)
  point P5 (48.5413, 84.076)
  point P6 (-19.0827, 0)
  point P7 (9.5413, 16.5261)
  point P8 (9.5413, -16.5261)
  point P9 (43.6662, 0)
  point P10 (53.6662, 45.4)
  point P11 (53.6662, -45.4)
  point P12 (12.9173, 0)
  dimension "d1" = 265
  dimension "d2" = 75
  dimension "d3" = 25
  dimension "d4" = 4.8
  dimension "d5" = 20
  dimension "d6" = 5
  dimension "d17" = 120
  dimension "d19" = 132.5
  dimension "d20" = 75
  dimension "d21" = 25
  dimension "d22" = 20
  dimension "d23" = 4.8
  dimension "d24" = 5
  dimension "d25" = 132.5
  dimension "d28" = 60
  dimension "d29" = 75
  dimension "d30" = 25
  dimension "d31" = 4.8
  dimension "d32" = 20
  dimension "d33" = 5
  dimension "d34" = 3
  dimension "d35" = 8
  dimension "d36" = 249
  dimension "d37" = 3
  dimension "d38" = 8
  dimension "d39" = 3
  dimension "d40" = 8
  dimension "d41" = 3
  dimension "d42" = 8
  dimension "d49" = 3
  dimension "d50" = 8
  dimension "d53" = 37
  dimension "d55" = 37
  dimension "d57" = 78
  dimension "d58" = 78
  dimension "d59" = 37
  dimension "d60" = 78
  dimension "d61" = 71
  dimension "d62" = 44
  dimension "d63" = 10
  dimension "d64" = 10
  dimension "d75" = 3
  dimension "d76" = 3
  dimension "d77" = 3
  dimension "d78" = 3
  dimension "d85" = 3
  dimension "d86" = 3
  dimension "d87" = 3
  dimension "d88" = 3
  dimension "d89" = 3
  dimension "d90" = 3
  dimension "d91" = 3
  dimension "d92" = 3
  dimension "d156" = 82.8
  dimension "d157" = 82.2
  dimension "d161" = 4.8
  dimension "d162" = 13.8
  dimension "d167" = 3
  dimension "d168" = 8
  dimension "d169" = 8
  dimension "d170" = 3
  dimension "d171" = 8
  dimension "d172" = 8
  dimension "d173" = 10.5
  dimension "d174" = 4.8
  dimension "d175" = 27.6
  dimension "d180" = 8
  dimension "d181" = 3
  dimension "d182" = 8
  dimension "d183" = 8
  dimension "d184" = 4.8
  dimension "d185" = 4.8
  dimension "d186" = 20
  dimension "d187" = 5
  dimension "d188" = 4
  dimension "d189" = 6
  dimension "d190" = 10
  dimension "d191" = 3
  dimension "d193" = 17
  dimension "d194" = 5
  dimension "d195" = 4.8
  dimension "d196" = 5
  dimension "d197" = 6
  dimension "d198" = 4
  dimension "d199" = 10
  dimension "d200" = 20
  dimension "d201" = 3
  dimension "d202" = 5
  dimension "d203" = 17
  dimension "d204" = 4.8
  dimension "d205" = 115
  dimension "d206" = 3
extrude "Extrude1" add sketch "Sketch1" against normal blind 4.8
